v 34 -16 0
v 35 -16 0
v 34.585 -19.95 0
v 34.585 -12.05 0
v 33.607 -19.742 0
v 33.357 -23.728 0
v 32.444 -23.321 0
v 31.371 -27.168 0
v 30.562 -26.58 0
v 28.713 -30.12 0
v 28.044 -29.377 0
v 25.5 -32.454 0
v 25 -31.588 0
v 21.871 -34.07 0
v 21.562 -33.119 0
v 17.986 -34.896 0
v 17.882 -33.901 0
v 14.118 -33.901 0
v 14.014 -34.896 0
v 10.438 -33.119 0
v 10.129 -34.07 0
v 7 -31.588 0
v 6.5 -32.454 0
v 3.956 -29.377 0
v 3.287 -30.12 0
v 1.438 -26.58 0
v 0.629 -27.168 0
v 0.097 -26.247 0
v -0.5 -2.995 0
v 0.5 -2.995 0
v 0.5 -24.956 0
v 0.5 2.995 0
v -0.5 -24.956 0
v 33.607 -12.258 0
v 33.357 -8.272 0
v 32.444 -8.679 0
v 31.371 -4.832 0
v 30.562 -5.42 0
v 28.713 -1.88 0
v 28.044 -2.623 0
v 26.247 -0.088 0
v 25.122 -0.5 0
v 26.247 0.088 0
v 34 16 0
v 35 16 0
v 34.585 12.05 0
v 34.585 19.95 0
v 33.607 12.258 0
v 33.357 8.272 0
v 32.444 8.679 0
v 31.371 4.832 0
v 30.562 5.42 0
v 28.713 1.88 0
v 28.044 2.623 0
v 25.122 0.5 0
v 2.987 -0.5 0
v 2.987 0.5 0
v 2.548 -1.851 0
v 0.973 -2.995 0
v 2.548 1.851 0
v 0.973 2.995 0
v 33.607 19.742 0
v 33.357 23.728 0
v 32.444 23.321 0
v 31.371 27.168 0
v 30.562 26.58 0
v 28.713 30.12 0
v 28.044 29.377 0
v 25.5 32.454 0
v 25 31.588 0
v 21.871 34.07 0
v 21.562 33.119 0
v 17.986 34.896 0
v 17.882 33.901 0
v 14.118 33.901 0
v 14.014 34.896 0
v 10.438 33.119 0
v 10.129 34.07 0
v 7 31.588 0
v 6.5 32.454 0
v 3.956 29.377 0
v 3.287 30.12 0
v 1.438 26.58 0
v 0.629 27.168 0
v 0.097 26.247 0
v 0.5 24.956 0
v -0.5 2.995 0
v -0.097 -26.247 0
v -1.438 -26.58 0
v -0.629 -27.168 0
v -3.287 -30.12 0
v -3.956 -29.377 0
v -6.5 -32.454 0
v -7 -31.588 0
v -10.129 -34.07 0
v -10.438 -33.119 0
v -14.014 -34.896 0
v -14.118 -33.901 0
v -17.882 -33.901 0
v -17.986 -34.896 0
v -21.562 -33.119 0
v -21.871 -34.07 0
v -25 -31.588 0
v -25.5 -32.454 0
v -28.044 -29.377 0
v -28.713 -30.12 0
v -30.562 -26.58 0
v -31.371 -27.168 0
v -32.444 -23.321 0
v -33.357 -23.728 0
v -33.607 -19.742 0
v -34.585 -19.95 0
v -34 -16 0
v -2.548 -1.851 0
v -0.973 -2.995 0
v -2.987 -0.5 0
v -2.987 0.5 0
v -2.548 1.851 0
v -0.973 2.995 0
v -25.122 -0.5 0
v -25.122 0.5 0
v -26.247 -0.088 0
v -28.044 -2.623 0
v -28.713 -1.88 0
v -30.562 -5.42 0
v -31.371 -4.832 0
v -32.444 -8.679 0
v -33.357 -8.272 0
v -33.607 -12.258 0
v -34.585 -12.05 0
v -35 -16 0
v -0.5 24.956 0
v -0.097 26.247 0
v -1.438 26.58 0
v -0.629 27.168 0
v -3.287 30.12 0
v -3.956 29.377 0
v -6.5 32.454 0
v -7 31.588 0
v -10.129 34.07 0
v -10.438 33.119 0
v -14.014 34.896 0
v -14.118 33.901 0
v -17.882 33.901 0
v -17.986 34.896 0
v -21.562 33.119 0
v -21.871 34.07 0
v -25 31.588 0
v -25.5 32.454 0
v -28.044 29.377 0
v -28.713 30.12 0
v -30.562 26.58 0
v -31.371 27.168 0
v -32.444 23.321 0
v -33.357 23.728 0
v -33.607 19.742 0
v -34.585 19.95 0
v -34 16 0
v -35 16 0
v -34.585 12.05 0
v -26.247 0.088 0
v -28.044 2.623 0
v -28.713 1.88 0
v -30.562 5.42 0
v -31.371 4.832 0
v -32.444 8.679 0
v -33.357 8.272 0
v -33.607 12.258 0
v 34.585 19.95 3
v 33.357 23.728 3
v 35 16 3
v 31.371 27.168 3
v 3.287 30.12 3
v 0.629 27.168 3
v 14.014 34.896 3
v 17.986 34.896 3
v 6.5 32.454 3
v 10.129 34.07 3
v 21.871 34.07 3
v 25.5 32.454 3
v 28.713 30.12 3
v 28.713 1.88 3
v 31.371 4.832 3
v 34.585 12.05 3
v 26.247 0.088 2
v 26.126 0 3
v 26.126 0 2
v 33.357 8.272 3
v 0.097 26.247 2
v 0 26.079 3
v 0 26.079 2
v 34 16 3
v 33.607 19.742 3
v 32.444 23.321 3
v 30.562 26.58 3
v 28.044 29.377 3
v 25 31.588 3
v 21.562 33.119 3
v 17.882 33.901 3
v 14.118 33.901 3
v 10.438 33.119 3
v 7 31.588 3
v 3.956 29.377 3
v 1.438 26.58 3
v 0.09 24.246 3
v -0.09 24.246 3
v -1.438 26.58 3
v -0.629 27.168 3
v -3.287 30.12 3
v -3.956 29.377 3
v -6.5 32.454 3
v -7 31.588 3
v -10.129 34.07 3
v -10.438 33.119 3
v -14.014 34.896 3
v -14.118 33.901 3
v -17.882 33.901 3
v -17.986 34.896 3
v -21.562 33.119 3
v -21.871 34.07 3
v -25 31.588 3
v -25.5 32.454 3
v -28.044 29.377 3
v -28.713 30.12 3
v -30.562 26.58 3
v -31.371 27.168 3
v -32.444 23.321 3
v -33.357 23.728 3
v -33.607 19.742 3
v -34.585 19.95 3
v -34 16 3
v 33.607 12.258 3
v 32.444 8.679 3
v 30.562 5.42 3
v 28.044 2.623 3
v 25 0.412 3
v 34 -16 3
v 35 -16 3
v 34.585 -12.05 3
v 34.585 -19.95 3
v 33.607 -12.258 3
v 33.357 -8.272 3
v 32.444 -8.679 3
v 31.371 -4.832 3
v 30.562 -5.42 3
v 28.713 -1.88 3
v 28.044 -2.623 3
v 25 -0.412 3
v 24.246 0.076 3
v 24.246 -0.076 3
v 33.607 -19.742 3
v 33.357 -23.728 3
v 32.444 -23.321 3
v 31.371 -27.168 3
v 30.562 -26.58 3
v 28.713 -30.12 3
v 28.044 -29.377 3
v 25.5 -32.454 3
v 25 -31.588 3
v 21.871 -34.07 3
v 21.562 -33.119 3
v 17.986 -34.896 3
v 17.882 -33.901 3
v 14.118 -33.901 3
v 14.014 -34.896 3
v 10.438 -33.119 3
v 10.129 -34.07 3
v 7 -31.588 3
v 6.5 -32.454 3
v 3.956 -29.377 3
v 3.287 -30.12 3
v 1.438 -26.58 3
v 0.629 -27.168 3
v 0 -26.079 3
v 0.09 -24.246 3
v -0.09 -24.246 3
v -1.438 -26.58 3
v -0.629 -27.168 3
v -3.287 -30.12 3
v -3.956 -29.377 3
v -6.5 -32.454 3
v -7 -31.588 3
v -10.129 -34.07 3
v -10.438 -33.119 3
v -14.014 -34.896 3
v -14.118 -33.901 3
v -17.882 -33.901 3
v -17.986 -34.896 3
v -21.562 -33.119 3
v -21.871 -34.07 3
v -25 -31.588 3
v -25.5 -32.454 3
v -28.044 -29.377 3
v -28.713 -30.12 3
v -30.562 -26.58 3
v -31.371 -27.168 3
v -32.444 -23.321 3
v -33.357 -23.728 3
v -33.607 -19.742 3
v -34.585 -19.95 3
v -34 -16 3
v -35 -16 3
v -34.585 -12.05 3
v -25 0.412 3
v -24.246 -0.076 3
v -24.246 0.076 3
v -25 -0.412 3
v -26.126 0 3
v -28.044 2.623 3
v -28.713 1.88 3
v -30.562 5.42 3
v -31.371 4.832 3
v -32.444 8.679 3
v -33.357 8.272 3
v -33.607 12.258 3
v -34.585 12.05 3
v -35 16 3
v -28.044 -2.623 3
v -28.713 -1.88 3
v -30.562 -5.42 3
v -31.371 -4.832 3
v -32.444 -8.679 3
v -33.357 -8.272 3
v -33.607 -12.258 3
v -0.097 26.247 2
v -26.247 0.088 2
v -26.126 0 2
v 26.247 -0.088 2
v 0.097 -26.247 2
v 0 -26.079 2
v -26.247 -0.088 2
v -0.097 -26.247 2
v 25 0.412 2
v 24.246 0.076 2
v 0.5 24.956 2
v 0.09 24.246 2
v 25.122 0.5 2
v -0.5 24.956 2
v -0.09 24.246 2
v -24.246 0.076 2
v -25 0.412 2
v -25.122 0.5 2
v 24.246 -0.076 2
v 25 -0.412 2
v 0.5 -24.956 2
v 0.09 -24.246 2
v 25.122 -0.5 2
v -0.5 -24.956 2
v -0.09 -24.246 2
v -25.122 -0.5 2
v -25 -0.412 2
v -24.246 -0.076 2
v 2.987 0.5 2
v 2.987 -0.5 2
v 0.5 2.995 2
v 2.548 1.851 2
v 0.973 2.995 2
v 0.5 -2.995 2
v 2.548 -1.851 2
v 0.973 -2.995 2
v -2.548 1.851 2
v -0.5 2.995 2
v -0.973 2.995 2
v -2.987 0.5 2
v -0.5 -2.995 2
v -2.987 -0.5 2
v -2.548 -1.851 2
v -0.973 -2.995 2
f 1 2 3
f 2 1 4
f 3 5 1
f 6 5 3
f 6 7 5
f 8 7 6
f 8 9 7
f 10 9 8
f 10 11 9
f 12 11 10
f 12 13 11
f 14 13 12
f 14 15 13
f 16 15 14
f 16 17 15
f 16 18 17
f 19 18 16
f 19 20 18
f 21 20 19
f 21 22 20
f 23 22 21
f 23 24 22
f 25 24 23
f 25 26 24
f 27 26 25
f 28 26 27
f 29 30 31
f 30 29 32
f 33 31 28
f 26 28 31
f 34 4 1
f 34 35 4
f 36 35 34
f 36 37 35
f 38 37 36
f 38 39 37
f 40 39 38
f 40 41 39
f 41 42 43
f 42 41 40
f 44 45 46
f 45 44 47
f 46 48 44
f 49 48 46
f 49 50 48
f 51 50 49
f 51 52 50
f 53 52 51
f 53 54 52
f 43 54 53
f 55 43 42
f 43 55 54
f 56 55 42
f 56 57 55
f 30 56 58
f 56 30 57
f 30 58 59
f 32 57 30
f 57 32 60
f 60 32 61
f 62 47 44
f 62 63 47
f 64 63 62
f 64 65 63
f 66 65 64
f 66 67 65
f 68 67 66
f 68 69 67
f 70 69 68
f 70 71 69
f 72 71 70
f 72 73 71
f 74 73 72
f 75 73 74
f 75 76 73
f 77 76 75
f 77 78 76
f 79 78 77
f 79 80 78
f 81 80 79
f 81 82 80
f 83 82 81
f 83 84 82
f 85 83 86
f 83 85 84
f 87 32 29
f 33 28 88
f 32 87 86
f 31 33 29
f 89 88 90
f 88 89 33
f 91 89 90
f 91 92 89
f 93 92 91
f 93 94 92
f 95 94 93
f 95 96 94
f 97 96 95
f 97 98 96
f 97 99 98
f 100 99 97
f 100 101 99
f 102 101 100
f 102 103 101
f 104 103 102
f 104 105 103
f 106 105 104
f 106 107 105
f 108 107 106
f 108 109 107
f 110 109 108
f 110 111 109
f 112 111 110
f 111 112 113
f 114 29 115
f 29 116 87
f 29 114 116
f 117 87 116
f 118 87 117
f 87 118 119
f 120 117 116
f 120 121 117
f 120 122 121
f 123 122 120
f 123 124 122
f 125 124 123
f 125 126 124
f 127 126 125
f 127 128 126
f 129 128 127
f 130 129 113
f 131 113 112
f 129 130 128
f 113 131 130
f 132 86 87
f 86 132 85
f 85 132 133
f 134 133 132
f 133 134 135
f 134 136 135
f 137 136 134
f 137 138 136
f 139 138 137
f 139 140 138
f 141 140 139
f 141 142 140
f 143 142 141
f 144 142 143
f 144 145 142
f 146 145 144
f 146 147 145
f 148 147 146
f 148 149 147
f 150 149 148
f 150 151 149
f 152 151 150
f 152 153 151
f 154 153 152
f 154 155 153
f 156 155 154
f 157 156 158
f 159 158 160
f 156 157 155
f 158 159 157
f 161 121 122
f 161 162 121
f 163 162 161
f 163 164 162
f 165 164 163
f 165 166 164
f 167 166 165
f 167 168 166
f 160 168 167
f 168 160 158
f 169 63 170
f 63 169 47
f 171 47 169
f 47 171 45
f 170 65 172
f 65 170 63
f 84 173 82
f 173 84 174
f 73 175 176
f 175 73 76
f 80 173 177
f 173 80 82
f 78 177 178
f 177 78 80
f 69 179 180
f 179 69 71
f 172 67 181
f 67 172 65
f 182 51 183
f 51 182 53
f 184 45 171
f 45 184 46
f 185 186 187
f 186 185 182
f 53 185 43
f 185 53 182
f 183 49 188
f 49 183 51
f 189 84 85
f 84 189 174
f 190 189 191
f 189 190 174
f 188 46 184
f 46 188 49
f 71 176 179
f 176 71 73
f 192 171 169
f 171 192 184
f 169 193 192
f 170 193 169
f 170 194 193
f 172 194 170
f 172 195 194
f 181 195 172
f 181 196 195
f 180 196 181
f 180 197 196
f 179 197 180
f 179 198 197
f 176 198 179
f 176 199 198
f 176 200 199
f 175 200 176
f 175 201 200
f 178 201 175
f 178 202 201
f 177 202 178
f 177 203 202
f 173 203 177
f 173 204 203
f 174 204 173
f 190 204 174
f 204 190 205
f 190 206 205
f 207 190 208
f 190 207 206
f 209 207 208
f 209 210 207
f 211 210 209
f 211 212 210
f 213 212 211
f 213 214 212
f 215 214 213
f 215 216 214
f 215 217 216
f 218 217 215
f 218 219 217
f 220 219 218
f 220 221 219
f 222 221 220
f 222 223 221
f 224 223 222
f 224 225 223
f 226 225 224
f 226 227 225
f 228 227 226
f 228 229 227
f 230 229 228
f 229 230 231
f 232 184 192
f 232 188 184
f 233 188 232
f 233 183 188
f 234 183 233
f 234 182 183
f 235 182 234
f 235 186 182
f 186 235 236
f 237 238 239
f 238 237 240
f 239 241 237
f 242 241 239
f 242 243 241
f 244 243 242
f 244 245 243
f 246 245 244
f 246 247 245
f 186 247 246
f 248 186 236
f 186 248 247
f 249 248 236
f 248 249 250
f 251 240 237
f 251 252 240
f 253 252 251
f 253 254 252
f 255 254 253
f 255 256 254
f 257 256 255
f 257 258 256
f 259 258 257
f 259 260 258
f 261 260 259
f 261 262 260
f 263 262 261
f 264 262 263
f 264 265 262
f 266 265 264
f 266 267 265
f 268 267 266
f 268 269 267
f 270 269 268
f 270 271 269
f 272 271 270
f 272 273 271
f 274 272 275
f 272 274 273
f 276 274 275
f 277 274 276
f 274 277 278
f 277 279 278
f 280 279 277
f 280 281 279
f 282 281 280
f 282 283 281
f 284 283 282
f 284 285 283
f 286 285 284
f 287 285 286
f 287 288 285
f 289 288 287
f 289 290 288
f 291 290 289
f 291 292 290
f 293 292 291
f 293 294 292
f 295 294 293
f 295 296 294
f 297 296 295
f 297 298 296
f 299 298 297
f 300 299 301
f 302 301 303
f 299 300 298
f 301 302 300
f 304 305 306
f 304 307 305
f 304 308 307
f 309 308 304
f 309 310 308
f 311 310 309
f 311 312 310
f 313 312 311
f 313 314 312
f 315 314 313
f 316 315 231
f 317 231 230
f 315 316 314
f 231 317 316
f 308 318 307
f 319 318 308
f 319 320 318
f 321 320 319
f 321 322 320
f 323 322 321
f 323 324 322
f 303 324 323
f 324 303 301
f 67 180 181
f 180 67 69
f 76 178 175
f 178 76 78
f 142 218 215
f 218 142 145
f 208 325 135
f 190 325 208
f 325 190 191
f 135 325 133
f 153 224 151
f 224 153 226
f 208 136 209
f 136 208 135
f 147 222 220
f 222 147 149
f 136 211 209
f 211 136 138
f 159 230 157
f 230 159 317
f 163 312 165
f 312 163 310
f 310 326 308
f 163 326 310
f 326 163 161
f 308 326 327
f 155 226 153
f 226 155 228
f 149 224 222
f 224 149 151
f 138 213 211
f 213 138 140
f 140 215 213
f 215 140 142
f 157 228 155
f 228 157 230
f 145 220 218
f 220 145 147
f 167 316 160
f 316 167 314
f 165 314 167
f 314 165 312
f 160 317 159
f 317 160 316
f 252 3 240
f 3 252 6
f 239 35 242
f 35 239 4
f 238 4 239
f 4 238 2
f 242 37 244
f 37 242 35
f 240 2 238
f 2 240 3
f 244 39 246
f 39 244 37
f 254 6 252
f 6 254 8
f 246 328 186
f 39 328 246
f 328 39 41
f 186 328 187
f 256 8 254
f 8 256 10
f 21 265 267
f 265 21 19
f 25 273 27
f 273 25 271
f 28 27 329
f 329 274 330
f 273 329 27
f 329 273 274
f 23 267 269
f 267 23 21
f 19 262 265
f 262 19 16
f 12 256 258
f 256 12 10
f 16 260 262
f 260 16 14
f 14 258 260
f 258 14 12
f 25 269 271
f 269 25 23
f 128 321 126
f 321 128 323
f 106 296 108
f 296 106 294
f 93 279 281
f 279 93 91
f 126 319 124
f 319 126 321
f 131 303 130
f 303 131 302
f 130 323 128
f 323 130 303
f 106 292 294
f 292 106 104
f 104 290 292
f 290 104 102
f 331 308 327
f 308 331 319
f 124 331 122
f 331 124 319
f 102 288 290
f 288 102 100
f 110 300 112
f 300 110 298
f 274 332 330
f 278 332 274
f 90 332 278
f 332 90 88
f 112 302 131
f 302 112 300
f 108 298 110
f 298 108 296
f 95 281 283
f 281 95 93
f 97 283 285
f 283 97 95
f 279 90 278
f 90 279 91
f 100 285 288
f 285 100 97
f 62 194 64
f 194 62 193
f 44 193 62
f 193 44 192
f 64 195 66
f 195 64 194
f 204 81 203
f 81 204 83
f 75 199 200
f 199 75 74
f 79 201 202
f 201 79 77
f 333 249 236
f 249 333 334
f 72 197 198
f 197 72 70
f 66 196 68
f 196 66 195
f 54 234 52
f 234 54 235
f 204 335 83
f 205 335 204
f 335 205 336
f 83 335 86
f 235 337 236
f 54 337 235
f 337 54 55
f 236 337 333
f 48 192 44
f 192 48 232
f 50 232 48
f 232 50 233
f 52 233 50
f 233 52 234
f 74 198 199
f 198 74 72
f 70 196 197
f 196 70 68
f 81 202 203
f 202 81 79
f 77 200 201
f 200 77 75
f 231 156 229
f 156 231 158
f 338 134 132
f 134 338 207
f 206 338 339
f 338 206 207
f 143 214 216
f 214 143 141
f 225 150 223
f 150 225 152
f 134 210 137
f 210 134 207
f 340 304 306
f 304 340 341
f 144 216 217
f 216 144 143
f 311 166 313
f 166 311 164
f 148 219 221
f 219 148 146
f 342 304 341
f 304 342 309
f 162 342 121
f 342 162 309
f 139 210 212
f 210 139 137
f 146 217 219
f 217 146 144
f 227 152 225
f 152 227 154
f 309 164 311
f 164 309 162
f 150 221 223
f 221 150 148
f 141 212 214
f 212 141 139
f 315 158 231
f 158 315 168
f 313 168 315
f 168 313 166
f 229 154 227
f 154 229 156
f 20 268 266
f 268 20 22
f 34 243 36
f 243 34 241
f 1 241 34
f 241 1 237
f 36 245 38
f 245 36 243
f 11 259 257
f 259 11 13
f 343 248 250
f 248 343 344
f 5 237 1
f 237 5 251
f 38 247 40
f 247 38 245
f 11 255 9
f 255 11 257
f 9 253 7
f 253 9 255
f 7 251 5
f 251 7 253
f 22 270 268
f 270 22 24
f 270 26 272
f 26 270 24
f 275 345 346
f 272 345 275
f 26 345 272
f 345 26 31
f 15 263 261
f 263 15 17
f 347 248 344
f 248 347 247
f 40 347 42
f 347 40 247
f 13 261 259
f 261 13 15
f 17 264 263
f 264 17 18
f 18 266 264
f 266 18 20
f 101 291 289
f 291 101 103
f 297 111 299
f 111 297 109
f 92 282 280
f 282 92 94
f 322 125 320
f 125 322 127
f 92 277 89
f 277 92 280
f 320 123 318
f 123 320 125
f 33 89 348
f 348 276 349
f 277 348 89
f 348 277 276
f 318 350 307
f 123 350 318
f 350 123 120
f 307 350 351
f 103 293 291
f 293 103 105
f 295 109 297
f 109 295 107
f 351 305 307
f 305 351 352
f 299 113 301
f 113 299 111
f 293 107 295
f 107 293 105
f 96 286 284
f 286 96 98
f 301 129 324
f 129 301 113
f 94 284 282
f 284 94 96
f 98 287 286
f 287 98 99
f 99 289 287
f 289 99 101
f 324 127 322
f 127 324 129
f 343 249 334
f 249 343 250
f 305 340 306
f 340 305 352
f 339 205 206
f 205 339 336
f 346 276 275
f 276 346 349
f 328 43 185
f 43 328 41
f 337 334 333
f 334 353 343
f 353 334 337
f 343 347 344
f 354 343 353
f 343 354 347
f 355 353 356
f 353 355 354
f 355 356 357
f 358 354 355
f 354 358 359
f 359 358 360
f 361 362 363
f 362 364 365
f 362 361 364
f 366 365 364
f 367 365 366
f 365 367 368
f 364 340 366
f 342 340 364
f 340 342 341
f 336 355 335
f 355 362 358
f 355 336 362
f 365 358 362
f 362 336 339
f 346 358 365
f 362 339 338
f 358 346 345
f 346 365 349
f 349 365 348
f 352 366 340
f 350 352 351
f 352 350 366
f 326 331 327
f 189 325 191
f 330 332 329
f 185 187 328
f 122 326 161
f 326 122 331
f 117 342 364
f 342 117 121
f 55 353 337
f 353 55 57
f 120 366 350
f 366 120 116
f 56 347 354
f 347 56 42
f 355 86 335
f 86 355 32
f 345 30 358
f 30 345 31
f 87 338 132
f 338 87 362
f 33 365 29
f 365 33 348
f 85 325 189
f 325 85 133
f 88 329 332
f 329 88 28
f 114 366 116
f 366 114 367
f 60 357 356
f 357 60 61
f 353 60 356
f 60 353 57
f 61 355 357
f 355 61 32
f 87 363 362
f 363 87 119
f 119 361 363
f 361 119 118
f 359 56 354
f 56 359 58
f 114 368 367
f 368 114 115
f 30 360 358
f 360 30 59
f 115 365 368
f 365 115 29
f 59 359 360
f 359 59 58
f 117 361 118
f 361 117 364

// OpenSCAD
distance_betweek_propellers_axis = 32; 
bumper_inner_radius = 18; 
bumper_width = 1; 
cross_height = 2; 
bumper_height = 3; 

module  props(r1,r2, h) 
{

    translate([r1,r1,0])
    cylinder(h, r2,r2, center=false);

    translate([-r1,r1,0])
    cylinder(h, r2,r2, center=false);

    translate([r1,-r1,0])
    cylinder(h, r2,r2, center=false);

    translate([-r1,-r1,0])
    cylinder(h, r2,r2, center=false);
}

function CircleCircleIntPos(x,r) = (2*x + sqrt(4*x*x-(4*(2*x*x-r*r))))/2;
function CircleCircleIntNeg(x,r) = (2*x - sqrt(4*x*x-(4*(2*x*x-r*r))))/2;

//scale([.1,.1,.1])
module frame(d,r1, r2, h1,h2) 
{
    
    
    dh = d/2;
    union()
    {
        
        difference()
        {
            difference()
            {
                props(dh,r2,h2);
                translate([0,0,-h2*.5])            
                    props(dh,r1,2*h2);
            }
            
            l = 2*CircleCircleIntPos(dh,r1);
            translate([-l/2,-l/2,-h2*.5])
            cube([l,l, 2*h2], center=false);                        
        }
        
        
        l = 2*CircleCircleIntPos(dh,r2);

        translate([0,0,h1/2])
        {
        cube([l,1, h1], center=true);
        cube([1,l, h1], center=true);
        cylinder(h1,l*.06, l*.06, center=true);
        }

    }
}

frame(distance_betweek_propellers_axis,
        bumper_inner_radius, 
        bumper_inner_radius + bumper_width, 
        cross_height,
bumper_height);

//props(16,15, 1) ;
